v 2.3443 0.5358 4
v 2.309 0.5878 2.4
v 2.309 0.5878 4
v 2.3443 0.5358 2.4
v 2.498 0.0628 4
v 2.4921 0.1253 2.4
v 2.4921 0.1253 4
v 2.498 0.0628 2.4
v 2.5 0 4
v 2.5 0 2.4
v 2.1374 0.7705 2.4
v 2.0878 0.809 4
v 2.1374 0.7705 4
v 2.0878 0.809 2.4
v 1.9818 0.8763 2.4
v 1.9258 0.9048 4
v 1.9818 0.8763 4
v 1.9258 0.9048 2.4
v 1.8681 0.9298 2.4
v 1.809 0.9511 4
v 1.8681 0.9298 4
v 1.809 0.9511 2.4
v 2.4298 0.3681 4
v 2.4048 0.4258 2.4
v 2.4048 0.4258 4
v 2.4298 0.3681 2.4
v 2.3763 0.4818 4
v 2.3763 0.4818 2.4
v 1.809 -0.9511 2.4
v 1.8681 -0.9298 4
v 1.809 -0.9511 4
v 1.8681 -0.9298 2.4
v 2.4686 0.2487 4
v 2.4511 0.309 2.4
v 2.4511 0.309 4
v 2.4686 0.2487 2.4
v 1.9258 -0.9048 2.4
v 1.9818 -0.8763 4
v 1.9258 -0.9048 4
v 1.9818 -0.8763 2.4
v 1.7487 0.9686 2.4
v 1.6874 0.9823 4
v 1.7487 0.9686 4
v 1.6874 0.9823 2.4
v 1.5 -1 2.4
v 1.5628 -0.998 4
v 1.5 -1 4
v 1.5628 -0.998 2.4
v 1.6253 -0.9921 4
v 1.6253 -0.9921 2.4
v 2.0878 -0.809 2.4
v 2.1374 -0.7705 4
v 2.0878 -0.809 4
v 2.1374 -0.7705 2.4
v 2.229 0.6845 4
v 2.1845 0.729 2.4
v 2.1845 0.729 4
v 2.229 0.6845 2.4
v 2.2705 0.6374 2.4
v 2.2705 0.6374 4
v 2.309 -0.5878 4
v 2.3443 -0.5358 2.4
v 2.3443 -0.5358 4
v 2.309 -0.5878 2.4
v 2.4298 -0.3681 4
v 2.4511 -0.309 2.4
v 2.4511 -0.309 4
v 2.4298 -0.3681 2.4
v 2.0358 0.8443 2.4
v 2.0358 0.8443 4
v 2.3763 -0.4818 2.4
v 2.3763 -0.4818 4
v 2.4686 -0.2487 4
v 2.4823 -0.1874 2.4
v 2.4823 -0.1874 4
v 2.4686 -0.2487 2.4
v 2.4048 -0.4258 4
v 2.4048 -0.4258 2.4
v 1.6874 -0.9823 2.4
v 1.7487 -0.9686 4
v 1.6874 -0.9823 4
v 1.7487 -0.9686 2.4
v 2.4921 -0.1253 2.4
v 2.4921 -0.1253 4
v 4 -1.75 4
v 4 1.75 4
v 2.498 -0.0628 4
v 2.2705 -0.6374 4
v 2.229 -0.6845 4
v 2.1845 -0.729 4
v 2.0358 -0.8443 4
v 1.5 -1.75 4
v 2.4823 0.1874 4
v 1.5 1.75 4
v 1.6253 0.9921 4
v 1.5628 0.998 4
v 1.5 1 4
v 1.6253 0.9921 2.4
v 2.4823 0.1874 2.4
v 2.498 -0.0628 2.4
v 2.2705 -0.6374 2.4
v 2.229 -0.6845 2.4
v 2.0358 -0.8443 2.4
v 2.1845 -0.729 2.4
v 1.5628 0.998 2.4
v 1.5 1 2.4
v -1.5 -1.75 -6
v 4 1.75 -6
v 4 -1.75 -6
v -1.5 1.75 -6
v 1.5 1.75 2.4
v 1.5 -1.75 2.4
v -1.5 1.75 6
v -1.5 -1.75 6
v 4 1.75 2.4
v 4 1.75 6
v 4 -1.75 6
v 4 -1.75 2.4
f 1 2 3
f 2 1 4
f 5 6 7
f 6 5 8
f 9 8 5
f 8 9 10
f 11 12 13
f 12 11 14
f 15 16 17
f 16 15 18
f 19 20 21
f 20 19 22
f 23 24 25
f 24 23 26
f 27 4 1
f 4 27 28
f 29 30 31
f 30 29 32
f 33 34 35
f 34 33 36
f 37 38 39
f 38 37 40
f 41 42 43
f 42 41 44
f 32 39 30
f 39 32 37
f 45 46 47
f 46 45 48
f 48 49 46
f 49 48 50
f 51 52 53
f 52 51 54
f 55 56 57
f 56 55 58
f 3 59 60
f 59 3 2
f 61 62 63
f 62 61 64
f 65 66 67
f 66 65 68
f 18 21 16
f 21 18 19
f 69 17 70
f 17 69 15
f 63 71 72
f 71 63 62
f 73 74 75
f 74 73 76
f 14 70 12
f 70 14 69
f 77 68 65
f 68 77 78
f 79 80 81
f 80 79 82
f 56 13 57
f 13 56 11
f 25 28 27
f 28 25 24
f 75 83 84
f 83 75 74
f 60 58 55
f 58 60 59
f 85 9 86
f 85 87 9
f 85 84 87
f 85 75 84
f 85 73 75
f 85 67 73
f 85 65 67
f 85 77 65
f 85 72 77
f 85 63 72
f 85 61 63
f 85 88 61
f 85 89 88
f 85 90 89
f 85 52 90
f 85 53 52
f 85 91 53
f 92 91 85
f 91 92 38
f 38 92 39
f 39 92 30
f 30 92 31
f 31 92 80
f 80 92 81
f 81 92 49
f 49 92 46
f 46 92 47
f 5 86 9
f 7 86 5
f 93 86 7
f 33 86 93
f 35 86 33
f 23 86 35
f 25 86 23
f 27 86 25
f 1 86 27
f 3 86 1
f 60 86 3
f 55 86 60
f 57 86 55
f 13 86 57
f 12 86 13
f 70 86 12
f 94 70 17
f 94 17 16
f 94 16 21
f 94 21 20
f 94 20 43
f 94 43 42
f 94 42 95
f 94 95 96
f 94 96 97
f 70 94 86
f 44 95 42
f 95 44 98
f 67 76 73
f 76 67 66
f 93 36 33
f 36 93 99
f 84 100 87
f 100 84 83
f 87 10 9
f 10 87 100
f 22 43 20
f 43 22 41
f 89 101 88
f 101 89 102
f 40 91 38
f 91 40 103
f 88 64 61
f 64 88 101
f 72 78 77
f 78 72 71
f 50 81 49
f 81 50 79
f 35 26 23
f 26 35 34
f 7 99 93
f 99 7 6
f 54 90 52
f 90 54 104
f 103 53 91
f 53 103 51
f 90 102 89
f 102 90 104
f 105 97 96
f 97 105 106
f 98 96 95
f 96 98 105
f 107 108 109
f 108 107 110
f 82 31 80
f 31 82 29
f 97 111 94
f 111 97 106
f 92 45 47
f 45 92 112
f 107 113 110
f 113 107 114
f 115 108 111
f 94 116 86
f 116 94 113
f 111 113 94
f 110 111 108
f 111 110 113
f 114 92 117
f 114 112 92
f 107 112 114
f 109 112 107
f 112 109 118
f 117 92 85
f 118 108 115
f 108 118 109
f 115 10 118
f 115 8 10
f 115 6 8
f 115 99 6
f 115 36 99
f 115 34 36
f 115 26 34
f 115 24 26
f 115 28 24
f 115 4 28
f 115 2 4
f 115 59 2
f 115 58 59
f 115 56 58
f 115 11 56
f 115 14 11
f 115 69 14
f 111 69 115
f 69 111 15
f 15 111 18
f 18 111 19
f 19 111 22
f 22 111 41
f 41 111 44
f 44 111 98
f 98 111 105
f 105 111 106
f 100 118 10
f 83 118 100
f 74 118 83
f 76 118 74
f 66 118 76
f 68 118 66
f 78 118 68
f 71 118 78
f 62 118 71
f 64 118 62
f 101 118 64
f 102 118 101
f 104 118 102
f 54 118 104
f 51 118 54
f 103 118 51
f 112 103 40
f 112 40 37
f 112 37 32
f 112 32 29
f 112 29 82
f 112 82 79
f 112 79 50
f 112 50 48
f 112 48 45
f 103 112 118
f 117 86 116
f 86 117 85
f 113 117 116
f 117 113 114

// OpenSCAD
$fn = 100;
translate(v = [0, 0, -1])
{
  union()
  {
    translate(v = [1.5, 0, 0])
    {
      cylinder(h = 10, r = 1, center = true);
    }
    cube(size = [3, 3.5, 10], center = true);
    translate(v = [0, 0, -0.8])
    {
      translate(v = [1.25, 0, 0])
      {
        cube(size = [5.5, 3.5, 8.4], center = true);
      }
    }
    translate(v = [1.25, 0, 0])
    {
      translate(v = [0, 0, 6])
      {
        cube(size = [5.5, 3.5, 2], center = true);
      }
    }
  }
}
